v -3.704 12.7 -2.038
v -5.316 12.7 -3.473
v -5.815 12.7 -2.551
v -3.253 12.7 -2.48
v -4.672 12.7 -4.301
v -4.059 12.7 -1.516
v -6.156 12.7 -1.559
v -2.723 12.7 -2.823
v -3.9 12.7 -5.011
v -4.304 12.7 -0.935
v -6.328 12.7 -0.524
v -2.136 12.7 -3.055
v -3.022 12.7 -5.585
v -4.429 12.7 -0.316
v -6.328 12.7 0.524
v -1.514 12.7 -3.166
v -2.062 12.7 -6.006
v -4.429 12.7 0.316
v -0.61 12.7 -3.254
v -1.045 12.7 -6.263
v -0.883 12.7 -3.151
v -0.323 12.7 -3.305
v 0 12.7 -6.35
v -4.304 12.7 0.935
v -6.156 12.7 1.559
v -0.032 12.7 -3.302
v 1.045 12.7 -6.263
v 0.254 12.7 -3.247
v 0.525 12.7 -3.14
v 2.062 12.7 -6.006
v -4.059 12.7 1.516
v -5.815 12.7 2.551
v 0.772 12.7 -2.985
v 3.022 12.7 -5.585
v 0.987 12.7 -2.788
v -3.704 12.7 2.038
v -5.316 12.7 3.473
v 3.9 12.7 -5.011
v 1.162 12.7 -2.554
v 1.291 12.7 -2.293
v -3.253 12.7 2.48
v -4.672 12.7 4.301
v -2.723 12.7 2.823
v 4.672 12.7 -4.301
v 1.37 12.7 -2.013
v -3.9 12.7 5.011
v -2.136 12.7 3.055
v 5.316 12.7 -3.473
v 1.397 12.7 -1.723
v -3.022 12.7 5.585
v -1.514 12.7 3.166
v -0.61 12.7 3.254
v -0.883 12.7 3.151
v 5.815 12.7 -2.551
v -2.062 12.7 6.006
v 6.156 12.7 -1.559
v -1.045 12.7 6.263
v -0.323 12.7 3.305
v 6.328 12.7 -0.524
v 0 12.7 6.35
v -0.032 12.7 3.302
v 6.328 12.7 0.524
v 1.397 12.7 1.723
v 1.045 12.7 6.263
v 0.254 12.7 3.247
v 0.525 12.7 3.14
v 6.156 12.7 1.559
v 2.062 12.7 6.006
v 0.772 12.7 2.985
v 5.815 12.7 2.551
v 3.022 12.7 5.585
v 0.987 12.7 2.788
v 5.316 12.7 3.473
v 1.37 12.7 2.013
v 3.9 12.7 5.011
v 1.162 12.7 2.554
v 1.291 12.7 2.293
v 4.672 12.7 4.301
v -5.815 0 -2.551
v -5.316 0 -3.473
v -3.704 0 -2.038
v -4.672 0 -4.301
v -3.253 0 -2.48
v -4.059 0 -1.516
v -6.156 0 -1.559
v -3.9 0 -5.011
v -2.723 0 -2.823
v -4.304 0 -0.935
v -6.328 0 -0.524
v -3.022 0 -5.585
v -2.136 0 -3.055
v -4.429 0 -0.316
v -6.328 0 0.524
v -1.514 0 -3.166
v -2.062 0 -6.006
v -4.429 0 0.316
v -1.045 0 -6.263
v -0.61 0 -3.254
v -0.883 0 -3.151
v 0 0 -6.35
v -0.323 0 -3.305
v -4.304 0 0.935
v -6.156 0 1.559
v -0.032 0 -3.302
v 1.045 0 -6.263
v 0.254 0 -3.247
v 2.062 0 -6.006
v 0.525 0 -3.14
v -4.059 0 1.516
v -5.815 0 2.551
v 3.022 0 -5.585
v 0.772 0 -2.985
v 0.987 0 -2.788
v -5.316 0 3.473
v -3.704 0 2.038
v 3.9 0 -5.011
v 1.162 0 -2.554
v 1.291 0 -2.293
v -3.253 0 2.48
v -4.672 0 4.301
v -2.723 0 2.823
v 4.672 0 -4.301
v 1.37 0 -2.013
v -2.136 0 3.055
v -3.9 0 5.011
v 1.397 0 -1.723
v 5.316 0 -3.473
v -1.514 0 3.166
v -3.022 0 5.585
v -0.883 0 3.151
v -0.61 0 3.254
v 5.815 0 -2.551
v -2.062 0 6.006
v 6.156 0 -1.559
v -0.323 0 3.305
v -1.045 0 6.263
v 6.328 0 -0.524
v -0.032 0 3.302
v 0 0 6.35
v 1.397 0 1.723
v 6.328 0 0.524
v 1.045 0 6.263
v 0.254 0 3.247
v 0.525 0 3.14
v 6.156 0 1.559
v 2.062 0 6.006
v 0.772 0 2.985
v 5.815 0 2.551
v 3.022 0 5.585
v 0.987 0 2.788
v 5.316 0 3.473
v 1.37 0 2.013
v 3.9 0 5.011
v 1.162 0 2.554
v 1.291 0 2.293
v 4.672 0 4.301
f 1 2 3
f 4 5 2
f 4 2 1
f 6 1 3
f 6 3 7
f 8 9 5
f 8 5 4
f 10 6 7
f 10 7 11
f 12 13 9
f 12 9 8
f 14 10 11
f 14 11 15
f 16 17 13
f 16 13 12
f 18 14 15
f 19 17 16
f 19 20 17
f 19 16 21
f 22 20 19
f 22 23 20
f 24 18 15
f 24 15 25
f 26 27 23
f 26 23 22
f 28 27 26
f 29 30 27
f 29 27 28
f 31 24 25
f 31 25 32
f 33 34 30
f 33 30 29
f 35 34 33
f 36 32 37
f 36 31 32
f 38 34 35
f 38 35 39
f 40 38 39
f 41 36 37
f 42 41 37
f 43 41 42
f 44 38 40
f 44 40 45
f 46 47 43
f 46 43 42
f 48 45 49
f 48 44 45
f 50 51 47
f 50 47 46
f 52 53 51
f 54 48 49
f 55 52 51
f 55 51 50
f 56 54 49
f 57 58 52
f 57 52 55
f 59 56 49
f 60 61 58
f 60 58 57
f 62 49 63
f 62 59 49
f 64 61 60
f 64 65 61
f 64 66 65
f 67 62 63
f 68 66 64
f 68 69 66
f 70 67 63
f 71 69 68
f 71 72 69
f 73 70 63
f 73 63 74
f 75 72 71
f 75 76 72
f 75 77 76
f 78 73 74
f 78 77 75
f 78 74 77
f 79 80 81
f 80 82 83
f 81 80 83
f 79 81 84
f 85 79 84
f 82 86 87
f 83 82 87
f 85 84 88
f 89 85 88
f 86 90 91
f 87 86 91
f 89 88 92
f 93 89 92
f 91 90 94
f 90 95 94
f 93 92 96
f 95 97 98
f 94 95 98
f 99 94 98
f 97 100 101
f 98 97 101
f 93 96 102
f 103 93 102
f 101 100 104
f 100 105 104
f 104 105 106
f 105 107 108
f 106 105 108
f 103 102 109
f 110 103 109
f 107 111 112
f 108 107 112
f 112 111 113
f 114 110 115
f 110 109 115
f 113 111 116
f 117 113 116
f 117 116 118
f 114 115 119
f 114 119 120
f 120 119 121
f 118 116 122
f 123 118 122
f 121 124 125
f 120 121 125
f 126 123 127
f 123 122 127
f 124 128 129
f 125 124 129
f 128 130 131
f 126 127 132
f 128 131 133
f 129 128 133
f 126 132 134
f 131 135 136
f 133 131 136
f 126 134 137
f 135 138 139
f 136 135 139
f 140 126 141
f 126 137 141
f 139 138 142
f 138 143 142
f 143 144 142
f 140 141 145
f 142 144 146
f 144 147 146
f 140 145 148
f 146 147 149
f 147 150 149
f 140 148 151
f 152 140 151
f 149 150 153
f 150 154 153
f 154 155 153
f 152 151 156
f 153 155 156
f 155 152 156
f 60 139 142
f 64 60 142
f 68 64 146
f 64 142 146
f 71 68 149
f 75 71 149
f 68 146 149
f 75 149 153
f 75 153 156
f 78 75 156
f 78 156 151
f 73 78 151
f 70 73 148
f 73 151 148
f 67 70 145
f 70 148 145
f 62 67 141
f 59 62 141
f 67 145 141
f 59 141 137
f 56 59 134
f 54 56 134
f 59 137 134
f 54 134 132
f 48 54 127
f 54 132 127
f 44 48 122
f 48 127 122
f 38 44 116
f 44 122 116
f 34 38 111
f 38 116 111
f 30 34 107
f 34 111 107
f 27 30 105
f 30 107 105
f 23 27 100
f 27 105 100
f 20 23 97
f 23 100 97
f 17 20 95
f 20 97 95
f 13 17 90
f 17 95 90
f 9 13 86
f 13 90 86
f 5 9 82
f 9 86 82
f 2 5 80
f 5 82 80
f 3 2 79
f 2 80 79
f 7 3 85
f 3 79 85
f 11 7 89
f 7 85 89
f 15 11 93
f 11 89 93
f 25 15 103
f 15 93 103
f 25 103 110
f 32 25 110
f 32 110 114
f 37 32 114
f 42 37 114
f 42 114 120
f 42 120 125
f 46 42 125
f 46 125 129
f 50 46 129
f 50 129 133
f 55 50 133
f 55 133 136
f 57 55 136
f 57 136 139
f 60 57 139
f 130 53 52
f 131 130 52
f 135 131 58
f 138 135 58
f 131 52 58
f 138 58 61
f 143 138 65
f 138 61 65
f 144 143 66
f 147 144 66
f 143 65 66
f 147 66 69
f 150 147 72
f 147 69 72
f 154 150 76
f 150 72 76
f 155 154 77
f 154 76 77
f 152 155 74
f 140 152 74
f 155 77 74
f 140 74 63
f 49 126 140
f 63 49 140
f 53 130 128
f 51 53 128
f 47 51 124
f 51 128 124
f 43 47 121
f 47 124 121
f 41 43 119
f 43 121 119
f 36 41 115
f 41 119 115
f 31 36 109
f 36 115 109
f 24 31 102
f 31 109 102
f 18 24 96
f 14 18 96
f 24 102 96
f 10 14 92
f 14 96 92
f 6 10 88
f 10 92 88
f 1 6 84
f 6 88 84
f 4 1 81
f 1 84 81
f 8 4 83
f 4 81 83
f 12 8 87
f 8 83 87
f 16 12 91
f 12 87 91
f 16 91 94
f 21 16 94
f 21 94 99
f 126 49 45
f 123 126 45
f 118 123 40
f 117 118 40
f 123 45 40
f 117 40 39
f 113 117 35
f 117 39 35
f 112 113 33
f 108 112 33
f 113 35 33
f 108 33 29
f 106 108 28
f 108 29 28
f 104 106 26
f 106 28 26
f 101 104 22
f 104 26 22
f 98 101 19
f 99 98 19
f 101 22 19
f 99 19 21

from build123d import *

# Parameters (mm, degrees)
SKETCH1_R           = 6.35
BOSS_EXTRUDE1_DEPTH = 12.7
CUT_EXTRUDE1_DEPTH  = 16.554259867


with BuildPart() as part:
    # Sketch1 → Boss-Extrude1 (new body)
    with BuildSketch(Plane(origin=(0, 0, 0), x_dir=(1, 0, 0), z_dir=(0, 1, 0))):
        with Locations(Location((0, 0, 0), (0, 0, 270))):
            Circle(SKETCH1_R)
        with BuildLine():
            Line((1.397, 1.722711816), (1.397, -1.722711816))
            ThreePointArc((1.397, -1.722711816), (-4.445, 0), (1.397, 1.722711816))
        make_face(mode=Mode.SUBTRACT)
    extrude(amount=BOSS_EXTRUDE1_DEPTH)

    # Sketch2 → Cut-Extrude1 (cut, through all)
    with BuildSketch(Plane(origin=(0, 12.7, 0), x_dir=(1, 0, 0), z_dir=(0, 1, 0))):
        with BuildLine():
            Line((-0.882804878, 3.151302102), (-0.882804878, -3.151302102))
            ThreePointArc((-0.882804878, -3.151302102), (0.65244788, -3.06792374), (1.397, -1.722711816))
            Line((1.397, -1.722711816), (1.397, 1.722711816))
            ThreePointArc((1.397, 1.722711816), (0.65244788, 3.06792374), (-0.882804878, 3.151302102))
        make_face()
    extrude(amount=-CUT_EXTRUDE1_DEPTH, mode=Mode.SUBTRACT)


solid = part.part
